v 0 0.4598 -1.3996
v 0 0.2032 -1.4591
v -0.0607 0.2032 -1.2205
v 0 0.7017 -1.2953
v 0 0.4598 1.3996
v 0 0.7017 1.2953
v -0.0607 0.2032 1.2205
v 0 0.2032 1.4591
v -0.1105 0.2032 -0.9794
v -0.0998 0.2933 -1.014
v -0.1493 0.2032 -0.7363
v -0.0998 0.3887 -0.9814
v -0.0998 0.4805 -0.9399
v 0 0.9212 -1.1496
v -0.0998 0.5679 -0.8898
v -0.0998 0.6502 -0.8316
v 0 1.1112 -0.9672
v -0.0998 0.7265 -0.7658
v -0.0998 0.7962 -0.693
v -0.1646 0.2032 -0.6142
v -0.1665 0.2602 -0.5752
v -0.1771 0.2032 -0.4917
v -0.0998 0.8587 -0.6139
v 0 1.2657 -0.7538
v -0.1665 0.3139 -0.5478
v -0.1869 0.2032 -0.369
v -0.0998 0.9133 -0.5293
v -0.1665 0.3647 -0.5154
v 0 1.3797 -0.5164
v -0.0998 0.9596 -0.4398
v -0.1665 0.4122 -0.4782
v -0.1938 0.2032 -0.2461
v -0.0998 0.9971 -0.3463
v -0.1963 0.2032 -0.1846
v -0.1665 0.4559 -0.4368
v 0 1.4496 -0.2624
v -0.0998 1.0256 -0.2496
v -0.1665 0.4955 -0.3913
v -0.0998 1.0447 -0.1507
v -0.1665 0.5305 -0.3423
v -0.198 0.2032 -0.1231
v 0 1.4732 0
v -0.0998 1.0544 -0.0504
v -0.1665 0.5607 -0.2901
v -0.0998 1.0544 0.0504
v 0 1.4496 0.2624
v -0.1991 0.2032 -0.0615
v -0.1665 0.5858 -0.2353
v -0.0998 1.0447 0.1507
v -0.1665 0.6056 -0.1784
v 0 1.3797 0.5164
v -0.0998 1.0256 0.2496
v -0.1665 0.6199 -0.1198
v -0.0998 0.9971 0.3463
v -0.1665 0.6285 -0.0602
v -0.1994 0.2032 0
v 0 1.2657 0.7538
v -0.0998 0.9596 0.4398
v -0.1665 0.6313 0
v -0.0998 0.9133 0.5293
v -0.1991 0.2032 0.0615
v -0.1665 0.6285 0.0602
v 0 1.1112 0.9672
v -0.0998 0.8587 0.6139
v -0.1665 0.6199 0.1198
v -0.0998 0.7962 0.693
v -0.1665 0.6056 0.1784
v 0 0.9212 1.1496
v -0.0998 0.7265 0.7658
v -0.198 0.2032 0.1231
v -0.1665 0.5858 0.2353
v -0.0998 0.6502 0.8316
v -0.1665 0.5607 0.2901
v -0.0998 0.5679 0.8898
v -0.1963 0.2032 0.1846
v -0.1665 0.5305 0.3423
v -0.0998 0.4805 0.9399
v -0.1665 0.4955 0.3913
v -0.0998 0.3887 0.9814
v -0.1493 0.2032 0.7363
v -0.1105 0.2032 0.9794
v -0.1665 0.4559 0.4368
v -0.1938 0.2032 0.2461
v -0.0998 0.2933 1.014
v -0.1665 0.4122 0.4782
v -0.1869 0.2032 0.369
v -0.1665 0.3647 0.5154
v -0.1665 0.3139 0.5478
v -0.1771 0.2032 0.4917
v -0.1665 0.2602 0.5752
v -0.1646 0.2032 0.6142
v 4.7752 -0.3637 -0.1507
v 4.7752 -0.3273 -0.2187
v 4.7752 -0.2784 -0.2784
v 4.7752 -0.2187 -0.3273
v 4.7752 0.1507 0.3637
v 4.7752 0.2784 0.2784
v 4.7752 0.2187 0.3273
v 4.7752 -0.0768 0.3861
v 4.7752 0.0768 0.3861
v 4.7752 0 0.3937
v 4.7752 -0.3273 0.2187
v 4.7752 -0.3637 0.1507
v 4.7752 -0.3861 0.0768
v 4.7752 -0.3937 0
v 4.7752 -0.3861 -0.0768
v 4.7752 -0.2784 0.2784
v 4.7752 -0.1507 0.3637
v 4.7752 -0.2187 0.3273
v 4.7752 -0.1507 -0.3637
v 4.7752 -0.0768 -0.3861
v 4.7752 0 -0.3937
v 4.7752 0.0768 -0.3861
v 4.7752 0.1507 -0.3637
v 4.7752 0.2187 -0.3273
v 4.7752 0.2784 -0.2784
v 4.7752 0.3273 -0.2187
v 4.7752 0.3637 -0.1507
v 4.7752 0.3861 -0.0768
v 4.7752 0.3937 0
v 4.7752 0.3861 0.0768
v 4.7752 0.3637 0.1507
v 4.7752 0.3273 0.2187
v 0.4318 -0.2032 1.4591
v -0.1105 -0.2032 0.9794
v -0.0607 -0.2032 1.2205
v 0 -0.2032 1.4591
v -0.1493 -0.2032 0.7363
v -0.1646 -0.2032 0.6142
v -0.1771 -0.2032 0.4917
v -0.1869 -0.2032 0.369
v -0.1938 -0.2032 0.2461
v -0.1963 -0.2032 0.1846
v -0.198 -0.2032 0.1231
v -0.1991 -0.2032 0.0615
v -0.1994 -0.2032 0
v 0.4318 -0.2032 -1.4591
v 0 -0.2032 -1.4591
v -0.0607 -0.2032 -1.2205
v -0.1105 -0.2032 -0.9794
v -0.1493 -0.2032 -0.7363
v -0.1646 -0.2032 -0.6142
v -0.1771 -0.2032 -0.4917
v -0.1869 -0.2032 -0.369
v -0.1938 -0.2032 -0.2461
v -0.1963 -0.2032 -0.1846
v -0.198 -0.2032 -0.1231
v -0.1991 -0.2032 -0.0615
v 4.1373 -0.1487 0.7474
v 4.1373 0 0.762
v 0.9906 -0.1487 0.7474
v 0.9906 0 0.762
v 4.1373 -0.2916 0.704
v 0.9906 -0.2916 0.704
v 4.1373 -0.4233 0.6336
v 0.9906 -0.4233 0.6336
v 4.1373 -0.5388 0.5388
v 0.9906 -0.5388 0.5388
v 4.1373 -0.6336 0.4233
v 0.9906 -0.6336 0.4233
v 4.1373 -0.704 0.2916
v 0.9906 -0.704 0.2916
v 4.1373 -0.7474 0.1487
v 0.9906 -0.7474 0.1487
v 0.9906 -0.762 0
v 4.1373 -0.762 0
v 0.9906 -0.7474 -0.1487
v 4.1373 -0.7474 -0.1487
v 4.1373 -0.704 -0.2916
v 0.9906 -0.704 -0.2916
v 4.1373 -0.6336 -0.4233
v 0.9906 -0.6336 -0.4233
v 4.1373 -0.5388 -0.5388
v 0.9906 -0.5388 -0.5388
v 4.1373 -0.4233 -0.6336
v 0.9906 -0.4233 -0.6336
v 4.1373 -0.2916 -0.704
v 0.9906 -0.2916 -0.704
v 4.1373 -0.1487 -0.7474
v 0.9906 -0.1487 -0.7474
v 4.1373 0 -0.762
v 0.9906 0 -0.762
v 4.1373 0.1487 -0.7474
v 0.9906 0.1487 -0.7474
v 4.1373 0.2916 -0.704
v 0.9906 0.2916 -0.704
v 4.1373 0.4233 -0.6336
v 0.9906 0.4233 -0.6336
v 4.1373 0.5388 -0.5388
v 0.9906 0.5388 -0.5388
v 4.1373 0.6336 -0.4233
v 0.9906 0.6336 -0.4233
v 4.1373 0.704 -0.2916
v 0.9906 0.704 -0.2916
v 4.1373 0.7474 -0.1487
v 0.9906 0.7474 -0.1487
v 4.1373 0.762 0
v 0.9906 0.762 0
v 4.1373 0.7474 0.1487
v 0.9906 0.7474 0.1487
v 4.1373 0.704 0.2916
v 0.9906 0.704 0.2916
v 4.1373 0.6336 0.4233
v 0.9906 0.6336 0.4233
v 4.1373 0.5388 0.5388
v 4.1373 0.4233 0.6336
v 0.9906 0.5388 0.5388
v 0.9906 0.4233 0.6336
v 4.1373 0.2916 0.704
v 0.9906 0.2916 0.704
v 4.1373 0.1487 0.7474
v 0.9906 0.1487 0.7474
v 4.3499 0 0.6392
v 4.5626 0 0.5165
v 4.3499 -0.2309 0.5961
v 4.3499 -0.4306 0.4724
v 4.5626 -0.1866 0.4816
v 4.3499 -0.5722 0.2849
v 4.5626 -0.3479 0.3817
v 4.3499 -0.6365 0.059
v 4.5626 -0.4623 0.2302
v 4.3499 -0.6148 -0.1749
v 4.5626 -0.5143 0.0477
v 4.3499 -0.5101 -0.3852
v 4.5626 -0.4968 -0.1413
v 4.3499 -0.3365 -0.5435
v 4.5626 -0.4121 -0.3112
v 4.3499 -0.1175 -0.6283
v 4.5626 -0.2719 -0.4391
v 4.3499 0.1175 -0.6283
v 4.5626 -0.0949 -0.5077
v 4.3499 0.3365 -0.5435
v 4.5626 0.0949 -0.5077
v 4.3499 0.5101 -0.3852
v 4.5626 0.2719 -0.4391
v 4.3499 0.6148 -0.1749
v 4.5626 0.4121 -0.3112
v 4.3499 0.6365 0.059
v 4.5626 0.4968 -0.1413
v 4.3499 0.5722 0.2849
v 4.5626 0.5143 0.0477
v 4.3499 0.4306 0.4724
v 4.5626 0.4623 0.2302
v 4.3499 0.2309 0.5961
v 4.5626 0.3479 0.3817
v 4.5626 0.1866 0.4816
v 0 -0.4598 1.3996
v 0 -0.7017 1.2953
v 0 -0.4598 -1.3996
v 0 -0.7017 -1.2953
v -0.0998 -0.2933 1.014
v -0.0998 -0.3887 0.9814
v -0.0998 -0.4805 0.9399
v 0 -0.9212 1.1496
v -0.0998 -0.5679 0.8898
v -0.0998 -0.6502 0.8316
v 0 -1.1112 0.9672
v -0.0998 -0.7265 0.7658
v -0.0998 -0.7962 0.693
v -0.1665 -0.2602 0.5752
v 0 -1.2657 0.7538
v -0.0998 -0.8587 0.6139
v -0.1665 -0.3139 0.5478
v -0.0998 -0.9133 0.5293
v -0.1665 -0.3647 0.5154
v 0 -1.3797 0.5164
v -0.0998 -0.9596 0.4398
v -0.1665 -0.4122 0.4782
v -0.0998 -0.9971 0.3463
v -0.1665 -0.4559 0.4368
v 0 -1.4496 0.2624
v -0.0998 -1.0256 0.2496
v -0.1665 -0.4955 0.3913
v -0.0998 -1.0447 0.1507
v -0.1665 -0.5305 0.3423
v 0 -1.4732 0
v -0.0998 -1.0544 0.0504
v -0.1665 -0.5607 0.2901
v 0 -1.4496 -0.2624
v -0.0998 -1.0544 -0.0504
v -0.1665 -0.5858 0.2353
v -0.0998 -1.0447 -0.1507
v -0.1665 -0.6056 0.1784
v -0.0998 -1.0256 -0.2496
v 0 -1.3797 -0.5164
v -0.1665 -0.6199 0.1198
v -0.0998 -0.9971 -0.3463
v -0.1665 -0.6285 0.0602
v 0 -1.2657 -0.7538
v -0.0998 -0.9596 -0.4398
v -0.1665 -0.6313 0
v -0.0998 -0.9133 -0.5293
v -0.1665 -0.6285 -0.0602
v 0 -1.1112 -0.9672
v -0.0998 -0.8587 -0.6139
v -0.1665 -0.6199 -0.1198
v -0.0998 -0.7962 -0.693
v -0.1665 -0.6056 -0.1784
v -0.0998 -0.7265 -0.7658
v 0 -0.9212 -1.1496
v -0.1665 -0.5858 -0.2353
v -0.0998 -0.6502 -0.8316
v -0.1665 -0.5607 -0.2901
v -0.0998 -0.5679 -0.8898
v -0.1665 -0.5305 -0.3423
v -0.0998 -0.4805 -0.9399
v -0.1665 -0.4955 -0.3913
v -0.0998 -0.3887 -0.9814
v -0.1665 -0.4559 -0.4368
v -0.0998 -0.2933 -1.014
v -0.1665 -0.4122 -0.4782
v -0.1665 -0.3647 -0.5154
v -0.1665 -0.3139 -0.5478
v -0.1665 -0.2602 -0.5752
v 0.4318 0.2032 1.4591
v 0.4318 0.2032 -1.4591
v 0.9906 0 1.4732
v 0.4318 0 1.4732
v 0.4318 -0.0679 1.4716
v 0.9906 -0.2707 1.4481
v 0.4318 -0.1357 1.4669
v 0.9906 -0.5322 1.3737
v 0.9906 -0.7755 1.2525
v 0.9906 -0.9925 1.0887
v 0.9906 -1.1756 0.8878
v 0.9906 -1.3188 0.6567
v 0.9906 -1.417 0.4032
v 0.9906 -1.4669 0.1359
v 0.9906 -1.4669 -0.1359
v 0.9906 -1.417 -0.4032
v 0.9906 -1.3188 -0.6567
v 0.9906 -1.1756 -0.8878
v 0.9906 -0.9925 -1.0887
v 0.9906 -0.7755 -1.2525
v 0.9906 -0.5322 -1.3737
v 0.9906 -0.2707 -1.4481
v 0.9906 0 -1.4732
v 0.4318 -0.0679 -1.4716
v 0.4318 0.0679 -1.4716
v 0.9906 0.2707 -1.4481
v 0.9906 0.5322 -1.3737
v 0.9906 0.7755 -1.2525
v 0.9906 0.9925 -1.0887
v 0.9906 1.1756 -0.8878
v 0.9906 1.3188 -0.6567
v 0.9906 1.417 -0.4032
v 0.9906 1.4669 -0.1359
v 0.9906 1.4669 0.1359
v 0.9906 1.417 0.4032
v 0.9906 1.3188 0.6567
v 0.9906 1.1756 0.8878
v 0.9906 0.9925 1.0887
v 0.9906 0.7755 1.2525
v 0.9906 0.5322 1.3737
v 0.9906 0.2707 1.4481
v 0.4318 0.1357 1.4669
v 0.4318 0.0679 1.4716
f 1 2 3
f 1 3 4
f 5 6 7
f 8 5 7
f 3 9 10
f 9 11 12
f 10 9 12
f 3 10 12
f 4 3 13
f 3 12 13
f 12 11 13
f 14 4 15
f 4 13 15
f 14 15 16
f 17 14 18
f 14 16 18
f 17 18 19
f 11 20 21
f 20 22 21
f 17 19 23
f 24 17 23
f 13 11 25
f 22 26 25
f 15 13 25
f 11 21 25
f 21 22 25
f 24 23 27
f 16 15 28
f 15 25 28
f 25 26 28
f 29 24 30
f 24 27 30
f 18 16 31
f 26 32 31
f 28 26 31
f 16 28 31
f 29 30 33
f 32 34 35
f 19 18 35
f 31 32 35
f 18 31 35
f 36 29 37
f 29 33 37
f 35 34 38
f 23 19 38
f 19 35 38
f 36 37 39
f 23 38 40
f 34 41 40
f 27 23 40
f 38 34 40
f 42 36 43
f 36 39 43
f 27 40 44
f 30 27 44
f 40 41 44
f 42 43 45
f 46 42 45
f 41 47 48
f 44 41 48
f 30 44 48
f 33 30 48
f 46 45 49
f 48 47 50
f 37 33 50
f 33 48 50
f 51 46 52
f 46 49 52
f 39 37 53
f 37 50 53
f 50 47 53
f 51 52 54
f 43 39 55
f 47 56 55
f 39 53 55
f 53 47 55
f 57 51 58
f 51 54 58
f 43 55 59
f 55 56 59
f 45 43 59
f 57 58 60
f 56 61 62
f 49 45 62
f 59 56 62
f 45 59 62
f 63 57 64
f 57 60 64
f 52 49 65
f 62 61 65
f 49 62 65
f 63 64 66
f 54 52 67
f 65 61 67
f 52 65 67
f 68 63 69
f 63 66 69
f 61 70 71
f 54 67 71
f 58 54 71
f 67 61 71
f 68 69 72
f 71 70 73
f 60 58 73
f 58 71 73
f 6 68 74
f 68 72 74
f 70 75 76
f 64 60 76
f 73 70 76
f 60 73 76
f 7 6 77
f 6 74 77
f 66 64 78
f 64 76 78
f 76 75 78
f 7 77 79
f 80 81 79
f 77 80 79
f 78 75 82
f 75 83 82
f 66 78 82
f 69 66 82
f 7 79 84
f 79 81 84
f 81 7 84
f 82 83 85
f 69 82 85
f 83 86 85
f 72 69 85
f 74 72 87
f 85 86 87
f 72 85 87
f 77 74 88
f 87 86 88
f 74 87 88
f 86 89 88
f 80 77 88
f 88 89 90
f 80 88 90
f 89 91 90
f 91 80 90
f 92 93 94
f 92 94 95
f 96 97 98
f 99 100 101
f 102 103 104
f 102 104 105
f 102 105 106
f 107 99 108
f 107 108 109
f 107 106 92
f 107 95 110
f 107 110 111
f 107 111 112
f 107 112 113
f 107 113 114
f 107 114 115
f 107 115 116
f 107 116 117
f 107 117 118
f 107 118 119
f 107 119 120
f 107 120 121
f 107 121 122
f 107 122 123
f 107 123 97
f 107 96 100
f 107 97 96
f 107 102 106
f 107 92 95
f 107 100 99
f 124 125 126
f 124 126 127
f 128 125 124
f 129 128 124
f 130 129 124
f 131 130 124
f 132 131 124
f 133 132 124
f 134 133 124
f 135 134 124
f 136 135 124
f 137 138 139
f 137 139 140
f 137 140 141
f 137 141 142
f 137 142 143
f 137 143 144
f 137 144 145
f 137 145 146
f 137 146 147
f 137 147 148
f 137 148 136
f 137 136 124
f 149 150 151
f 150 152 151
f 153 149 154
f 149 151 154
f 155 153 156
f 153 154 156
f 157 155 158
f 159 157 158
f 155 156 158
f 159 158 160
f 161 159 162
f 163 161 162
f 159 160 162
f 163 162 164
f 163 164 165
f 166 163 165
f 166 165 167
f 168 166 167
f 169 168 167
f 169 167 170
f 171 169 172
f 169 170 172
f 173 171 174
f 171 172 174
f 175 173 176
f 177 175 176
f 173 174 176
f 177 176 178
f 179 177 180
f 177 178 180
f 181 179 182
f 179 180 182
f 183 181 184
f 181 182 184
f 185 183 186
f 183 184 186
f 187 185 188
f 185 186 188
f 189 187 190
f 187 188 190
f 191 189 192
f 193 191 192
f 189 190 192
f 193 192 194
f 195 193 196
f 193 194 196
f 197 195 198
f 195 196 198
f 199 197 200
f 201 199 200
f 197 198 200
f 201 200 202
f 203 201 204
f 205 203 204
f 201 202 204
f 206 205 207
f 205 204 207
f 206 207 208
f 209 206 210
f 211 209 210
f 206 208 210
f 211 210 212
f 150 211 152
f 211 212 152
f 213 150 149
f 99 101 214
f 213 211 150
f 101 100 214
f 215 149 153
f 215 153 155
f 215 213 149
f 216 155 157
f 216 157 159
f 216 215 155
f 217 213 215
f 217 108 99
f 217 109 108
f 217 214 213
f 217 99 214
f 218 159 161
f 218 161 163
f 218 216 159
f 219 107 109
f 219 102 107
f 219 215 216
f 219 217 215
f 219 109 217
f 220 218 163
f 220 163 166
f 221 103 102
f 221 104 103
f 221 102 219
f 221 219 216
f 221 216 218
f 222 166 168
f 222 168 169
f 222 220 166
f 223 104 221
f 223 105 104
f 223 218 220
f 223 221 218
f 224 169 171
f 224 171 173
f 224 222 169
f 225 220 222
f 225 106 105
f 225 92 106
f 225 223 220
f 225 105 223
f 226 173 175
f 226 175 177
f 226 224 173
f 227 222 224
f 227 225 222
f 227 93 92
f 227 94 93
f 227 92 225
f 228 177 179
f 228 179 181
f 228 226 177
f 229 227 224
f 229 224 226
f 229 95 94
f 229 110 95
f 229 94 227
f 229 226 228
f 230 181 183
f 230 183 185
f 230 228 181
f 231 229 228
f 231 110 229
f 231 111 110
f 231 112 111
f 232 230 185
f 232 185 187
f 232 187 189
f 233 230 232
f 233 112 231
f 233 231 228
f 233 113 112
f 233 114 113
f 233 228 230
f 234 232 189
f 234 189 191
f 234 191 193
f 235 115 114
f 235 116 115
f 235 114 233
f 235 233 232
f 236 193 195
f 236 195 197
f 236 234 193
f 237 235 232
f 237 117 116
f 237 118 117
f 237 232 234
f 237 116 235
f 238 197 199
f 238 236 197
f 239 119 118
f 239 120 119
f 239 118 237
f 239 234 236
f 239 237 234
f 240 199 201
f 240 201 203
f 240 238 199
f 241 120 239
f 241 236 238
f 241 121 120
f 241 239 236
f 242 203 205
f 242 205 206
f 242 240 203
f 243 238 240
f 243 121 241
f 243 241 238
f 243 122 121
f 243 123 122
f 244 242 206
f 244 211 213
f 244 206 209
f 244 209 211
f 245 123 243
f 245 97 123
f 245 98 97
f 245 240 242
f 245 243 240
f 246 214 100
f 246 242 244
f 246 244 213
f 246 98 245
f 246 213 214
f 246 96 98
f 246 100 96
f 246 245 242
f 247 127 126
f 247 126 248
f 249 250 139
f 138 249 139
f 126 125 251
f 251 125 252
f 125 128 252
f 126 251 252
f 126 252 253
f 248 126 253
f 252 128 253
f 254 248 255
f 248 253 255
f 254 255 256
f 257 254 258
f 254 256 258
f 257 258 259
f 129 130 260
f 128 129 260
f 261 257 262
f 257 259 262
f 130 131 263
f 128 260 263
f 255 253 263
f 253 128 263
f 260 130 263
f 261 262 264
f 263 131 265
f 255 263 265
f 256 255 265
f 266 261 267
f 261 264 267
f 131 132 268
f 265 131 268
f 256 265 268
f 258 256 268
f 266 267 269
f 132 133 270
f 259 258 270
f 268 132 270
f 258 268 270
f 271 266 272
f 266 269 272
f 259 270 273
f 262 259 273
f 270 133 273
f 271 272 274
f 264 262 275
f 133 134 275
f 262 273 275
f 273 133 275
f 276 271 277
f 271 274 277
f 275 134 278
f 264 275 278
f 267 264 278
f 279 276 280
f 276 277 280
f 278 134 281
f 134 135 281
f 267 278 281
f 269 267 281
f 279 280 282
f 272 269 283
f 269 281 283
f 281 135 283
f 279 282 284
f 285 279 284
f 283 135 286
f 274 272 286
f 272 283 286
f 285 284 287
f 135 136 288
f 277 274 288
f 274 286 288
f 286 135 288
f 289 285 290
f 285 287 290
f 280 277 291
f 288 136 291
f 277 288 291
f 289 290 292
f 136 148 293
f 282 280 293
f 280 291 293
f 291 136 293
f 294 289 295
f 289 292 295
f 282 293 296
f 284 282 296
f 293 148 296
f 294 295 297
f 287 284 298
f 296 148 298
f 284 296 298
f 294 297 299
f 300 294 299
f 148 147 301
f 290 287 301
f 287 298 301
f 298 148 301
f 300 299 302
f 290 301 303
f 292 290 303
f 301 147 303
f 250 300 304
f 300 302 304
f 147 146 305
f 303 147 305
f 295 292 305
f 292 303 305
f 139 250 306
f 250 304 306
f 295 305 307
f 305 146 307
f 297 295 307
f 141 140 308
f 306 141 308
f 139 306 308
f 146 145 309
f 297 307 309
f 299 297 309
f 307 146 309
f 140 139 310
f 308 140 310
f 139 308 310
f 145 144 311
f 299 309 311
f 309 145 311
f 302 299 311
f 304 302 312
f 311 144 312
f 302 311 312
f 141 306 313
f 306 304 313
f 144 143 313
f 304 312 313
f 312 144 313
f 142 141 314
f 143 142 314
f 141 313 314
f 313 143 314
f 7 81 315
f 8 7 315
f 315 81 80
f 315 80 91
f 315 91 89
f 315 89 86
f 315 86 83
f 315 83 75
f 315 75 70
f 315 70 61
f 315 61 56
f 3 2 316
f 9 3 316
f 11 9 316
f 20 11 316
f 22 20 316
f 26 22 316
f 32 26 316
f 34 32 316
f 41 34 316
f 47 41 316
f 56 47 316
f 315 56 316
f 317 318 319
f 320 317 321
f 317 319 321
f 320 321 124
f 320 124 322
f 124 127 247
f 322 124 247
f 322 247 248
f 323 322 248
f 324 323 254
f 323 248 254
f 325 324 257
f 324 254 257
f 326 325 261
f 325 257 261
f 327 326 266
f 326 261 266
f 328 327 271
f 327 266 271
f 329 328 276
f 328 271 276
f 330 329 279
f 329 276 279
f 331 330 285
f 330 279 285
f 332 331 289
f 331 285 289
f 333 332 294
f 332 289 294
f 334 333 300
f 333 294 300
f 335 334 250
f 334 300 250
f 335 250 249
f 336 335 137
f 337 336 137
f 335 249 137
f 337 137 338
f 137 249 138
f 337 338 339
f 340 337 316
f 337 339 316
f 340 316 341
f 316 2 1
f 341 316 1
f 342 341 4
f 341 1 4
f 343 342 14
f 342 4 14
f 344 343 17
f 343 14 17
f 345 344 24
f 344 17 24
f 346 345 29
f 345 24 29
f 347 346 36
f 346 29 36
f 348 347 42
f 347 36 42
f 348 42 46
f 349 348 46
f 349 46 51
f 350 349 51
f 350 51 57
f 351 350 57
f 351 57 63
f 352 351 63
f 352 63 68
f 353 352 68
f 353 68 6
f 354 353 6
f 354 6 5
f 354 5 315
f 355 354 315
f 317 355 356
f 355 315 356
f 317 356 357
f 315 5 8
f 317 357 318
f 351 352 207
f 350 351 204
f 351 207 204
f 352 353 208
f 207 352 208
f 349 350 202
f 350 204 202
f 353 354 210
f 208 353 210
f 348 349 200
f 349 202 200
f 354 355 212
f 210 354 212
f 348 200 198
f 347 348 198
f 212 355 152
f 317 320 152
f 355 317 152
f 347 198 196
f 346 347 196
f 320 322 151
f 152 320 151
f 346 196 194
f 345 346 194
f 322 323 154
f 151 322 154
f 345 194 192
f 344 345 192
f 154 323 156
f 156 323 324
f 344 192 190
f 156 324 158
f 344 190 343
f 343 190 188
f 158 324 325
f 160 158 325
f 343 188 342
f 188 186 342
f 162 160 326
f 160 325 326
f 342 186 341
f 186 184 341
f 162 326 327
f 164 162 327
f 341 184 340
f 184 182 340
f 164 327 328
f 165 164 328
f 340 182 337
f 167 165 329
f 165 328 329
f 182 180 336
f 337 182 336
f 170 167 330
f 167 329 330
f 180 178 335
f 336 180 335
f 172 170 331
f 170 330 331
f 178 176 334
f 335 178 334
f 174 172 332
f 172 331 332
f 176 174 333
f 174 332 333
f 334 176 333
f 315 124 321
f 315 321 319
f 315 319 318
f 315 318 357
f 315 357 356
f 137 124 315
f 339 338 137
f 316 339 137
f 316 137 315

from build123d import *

# Parameters (mm, degrees)
SLOT_CUT_EXTRUDE1_DEPTH      = 6.209910894
SLOT_CUT_EXTRUDE1_DEPTH_BACK = 6.209910894
SKETCH2_W                    = 0.635
SKETCH2_H                    = 0.4064


with BuildPart() as part:
    # Sketch1 → base-Revolve (revolve)
    with BuildSketch(Plane.XY, mode=Mode.PRIVATE) as base_revolve_sk:
        with BuildLine():
            Line((0.9906, 0.762), (0.9906, 1.4732))
            Line((0.9906, 1.4732), (0, 1.4732))
            ThreePointArc((0, 1.4732), (-0.152160654, 0.743573883), (-0.2032, 0))
            Line((-0.2032, 0), (0, 0))
            Line((0, 0), (4.7752, 0))
            Line((4.7752, 0), (4.7752, 0.762))
            Line((4.7752, 0.762), (0.9906, 0.762))
        make_face()
    revolve(base_revolve_sk.sketch.rotate(Axis((0, 0, 0), (1, 0, 0)), 90), axis=Axis((0, 0, 0), (1, 0, 0)))

    # Sketch2 → slot_Cut-Extrude1 (cut, two sides: drawn at the far end of the back side and taken through both)
    with BuildSketch(Plane.XY.offset(-SLOT_CUT_EXTRUDE1_DEPTH_BACK)):
        with Locations((0.1143, 0)):
            Rectangle(SKETCH2_W, SKETCH2_H)
    extrude(amount=SLOT_CUT_EXTRUDE1_DEPTH + SLOT_CUT_EXTRUDE1_DEPTH_BACK, mode=Mode.SUBTRACT)

    # Sketch8 → point_Cut-Revolve1 (revolve, cut)
    with BuildSketch(Plane.XY, mode=Mode.PRIVATE) as point_cut_revolve1_sk:
        Polygon((4.7752, 0), (5.2832, 0), (5.2832, 1.27), (4.137285688, 1.27), (4.137285688, 0.762), (4.7752, 0.3937), align=None)
    revolve(point_cut_revolve1_sk.sketch.rotate(Axis((0, 0, 0), (1, 0, 0)), 90), axis=Axis((0, 0, 0), (1, 0, 0)), mode=Mode.SUBTRACT)


solid = part.part
